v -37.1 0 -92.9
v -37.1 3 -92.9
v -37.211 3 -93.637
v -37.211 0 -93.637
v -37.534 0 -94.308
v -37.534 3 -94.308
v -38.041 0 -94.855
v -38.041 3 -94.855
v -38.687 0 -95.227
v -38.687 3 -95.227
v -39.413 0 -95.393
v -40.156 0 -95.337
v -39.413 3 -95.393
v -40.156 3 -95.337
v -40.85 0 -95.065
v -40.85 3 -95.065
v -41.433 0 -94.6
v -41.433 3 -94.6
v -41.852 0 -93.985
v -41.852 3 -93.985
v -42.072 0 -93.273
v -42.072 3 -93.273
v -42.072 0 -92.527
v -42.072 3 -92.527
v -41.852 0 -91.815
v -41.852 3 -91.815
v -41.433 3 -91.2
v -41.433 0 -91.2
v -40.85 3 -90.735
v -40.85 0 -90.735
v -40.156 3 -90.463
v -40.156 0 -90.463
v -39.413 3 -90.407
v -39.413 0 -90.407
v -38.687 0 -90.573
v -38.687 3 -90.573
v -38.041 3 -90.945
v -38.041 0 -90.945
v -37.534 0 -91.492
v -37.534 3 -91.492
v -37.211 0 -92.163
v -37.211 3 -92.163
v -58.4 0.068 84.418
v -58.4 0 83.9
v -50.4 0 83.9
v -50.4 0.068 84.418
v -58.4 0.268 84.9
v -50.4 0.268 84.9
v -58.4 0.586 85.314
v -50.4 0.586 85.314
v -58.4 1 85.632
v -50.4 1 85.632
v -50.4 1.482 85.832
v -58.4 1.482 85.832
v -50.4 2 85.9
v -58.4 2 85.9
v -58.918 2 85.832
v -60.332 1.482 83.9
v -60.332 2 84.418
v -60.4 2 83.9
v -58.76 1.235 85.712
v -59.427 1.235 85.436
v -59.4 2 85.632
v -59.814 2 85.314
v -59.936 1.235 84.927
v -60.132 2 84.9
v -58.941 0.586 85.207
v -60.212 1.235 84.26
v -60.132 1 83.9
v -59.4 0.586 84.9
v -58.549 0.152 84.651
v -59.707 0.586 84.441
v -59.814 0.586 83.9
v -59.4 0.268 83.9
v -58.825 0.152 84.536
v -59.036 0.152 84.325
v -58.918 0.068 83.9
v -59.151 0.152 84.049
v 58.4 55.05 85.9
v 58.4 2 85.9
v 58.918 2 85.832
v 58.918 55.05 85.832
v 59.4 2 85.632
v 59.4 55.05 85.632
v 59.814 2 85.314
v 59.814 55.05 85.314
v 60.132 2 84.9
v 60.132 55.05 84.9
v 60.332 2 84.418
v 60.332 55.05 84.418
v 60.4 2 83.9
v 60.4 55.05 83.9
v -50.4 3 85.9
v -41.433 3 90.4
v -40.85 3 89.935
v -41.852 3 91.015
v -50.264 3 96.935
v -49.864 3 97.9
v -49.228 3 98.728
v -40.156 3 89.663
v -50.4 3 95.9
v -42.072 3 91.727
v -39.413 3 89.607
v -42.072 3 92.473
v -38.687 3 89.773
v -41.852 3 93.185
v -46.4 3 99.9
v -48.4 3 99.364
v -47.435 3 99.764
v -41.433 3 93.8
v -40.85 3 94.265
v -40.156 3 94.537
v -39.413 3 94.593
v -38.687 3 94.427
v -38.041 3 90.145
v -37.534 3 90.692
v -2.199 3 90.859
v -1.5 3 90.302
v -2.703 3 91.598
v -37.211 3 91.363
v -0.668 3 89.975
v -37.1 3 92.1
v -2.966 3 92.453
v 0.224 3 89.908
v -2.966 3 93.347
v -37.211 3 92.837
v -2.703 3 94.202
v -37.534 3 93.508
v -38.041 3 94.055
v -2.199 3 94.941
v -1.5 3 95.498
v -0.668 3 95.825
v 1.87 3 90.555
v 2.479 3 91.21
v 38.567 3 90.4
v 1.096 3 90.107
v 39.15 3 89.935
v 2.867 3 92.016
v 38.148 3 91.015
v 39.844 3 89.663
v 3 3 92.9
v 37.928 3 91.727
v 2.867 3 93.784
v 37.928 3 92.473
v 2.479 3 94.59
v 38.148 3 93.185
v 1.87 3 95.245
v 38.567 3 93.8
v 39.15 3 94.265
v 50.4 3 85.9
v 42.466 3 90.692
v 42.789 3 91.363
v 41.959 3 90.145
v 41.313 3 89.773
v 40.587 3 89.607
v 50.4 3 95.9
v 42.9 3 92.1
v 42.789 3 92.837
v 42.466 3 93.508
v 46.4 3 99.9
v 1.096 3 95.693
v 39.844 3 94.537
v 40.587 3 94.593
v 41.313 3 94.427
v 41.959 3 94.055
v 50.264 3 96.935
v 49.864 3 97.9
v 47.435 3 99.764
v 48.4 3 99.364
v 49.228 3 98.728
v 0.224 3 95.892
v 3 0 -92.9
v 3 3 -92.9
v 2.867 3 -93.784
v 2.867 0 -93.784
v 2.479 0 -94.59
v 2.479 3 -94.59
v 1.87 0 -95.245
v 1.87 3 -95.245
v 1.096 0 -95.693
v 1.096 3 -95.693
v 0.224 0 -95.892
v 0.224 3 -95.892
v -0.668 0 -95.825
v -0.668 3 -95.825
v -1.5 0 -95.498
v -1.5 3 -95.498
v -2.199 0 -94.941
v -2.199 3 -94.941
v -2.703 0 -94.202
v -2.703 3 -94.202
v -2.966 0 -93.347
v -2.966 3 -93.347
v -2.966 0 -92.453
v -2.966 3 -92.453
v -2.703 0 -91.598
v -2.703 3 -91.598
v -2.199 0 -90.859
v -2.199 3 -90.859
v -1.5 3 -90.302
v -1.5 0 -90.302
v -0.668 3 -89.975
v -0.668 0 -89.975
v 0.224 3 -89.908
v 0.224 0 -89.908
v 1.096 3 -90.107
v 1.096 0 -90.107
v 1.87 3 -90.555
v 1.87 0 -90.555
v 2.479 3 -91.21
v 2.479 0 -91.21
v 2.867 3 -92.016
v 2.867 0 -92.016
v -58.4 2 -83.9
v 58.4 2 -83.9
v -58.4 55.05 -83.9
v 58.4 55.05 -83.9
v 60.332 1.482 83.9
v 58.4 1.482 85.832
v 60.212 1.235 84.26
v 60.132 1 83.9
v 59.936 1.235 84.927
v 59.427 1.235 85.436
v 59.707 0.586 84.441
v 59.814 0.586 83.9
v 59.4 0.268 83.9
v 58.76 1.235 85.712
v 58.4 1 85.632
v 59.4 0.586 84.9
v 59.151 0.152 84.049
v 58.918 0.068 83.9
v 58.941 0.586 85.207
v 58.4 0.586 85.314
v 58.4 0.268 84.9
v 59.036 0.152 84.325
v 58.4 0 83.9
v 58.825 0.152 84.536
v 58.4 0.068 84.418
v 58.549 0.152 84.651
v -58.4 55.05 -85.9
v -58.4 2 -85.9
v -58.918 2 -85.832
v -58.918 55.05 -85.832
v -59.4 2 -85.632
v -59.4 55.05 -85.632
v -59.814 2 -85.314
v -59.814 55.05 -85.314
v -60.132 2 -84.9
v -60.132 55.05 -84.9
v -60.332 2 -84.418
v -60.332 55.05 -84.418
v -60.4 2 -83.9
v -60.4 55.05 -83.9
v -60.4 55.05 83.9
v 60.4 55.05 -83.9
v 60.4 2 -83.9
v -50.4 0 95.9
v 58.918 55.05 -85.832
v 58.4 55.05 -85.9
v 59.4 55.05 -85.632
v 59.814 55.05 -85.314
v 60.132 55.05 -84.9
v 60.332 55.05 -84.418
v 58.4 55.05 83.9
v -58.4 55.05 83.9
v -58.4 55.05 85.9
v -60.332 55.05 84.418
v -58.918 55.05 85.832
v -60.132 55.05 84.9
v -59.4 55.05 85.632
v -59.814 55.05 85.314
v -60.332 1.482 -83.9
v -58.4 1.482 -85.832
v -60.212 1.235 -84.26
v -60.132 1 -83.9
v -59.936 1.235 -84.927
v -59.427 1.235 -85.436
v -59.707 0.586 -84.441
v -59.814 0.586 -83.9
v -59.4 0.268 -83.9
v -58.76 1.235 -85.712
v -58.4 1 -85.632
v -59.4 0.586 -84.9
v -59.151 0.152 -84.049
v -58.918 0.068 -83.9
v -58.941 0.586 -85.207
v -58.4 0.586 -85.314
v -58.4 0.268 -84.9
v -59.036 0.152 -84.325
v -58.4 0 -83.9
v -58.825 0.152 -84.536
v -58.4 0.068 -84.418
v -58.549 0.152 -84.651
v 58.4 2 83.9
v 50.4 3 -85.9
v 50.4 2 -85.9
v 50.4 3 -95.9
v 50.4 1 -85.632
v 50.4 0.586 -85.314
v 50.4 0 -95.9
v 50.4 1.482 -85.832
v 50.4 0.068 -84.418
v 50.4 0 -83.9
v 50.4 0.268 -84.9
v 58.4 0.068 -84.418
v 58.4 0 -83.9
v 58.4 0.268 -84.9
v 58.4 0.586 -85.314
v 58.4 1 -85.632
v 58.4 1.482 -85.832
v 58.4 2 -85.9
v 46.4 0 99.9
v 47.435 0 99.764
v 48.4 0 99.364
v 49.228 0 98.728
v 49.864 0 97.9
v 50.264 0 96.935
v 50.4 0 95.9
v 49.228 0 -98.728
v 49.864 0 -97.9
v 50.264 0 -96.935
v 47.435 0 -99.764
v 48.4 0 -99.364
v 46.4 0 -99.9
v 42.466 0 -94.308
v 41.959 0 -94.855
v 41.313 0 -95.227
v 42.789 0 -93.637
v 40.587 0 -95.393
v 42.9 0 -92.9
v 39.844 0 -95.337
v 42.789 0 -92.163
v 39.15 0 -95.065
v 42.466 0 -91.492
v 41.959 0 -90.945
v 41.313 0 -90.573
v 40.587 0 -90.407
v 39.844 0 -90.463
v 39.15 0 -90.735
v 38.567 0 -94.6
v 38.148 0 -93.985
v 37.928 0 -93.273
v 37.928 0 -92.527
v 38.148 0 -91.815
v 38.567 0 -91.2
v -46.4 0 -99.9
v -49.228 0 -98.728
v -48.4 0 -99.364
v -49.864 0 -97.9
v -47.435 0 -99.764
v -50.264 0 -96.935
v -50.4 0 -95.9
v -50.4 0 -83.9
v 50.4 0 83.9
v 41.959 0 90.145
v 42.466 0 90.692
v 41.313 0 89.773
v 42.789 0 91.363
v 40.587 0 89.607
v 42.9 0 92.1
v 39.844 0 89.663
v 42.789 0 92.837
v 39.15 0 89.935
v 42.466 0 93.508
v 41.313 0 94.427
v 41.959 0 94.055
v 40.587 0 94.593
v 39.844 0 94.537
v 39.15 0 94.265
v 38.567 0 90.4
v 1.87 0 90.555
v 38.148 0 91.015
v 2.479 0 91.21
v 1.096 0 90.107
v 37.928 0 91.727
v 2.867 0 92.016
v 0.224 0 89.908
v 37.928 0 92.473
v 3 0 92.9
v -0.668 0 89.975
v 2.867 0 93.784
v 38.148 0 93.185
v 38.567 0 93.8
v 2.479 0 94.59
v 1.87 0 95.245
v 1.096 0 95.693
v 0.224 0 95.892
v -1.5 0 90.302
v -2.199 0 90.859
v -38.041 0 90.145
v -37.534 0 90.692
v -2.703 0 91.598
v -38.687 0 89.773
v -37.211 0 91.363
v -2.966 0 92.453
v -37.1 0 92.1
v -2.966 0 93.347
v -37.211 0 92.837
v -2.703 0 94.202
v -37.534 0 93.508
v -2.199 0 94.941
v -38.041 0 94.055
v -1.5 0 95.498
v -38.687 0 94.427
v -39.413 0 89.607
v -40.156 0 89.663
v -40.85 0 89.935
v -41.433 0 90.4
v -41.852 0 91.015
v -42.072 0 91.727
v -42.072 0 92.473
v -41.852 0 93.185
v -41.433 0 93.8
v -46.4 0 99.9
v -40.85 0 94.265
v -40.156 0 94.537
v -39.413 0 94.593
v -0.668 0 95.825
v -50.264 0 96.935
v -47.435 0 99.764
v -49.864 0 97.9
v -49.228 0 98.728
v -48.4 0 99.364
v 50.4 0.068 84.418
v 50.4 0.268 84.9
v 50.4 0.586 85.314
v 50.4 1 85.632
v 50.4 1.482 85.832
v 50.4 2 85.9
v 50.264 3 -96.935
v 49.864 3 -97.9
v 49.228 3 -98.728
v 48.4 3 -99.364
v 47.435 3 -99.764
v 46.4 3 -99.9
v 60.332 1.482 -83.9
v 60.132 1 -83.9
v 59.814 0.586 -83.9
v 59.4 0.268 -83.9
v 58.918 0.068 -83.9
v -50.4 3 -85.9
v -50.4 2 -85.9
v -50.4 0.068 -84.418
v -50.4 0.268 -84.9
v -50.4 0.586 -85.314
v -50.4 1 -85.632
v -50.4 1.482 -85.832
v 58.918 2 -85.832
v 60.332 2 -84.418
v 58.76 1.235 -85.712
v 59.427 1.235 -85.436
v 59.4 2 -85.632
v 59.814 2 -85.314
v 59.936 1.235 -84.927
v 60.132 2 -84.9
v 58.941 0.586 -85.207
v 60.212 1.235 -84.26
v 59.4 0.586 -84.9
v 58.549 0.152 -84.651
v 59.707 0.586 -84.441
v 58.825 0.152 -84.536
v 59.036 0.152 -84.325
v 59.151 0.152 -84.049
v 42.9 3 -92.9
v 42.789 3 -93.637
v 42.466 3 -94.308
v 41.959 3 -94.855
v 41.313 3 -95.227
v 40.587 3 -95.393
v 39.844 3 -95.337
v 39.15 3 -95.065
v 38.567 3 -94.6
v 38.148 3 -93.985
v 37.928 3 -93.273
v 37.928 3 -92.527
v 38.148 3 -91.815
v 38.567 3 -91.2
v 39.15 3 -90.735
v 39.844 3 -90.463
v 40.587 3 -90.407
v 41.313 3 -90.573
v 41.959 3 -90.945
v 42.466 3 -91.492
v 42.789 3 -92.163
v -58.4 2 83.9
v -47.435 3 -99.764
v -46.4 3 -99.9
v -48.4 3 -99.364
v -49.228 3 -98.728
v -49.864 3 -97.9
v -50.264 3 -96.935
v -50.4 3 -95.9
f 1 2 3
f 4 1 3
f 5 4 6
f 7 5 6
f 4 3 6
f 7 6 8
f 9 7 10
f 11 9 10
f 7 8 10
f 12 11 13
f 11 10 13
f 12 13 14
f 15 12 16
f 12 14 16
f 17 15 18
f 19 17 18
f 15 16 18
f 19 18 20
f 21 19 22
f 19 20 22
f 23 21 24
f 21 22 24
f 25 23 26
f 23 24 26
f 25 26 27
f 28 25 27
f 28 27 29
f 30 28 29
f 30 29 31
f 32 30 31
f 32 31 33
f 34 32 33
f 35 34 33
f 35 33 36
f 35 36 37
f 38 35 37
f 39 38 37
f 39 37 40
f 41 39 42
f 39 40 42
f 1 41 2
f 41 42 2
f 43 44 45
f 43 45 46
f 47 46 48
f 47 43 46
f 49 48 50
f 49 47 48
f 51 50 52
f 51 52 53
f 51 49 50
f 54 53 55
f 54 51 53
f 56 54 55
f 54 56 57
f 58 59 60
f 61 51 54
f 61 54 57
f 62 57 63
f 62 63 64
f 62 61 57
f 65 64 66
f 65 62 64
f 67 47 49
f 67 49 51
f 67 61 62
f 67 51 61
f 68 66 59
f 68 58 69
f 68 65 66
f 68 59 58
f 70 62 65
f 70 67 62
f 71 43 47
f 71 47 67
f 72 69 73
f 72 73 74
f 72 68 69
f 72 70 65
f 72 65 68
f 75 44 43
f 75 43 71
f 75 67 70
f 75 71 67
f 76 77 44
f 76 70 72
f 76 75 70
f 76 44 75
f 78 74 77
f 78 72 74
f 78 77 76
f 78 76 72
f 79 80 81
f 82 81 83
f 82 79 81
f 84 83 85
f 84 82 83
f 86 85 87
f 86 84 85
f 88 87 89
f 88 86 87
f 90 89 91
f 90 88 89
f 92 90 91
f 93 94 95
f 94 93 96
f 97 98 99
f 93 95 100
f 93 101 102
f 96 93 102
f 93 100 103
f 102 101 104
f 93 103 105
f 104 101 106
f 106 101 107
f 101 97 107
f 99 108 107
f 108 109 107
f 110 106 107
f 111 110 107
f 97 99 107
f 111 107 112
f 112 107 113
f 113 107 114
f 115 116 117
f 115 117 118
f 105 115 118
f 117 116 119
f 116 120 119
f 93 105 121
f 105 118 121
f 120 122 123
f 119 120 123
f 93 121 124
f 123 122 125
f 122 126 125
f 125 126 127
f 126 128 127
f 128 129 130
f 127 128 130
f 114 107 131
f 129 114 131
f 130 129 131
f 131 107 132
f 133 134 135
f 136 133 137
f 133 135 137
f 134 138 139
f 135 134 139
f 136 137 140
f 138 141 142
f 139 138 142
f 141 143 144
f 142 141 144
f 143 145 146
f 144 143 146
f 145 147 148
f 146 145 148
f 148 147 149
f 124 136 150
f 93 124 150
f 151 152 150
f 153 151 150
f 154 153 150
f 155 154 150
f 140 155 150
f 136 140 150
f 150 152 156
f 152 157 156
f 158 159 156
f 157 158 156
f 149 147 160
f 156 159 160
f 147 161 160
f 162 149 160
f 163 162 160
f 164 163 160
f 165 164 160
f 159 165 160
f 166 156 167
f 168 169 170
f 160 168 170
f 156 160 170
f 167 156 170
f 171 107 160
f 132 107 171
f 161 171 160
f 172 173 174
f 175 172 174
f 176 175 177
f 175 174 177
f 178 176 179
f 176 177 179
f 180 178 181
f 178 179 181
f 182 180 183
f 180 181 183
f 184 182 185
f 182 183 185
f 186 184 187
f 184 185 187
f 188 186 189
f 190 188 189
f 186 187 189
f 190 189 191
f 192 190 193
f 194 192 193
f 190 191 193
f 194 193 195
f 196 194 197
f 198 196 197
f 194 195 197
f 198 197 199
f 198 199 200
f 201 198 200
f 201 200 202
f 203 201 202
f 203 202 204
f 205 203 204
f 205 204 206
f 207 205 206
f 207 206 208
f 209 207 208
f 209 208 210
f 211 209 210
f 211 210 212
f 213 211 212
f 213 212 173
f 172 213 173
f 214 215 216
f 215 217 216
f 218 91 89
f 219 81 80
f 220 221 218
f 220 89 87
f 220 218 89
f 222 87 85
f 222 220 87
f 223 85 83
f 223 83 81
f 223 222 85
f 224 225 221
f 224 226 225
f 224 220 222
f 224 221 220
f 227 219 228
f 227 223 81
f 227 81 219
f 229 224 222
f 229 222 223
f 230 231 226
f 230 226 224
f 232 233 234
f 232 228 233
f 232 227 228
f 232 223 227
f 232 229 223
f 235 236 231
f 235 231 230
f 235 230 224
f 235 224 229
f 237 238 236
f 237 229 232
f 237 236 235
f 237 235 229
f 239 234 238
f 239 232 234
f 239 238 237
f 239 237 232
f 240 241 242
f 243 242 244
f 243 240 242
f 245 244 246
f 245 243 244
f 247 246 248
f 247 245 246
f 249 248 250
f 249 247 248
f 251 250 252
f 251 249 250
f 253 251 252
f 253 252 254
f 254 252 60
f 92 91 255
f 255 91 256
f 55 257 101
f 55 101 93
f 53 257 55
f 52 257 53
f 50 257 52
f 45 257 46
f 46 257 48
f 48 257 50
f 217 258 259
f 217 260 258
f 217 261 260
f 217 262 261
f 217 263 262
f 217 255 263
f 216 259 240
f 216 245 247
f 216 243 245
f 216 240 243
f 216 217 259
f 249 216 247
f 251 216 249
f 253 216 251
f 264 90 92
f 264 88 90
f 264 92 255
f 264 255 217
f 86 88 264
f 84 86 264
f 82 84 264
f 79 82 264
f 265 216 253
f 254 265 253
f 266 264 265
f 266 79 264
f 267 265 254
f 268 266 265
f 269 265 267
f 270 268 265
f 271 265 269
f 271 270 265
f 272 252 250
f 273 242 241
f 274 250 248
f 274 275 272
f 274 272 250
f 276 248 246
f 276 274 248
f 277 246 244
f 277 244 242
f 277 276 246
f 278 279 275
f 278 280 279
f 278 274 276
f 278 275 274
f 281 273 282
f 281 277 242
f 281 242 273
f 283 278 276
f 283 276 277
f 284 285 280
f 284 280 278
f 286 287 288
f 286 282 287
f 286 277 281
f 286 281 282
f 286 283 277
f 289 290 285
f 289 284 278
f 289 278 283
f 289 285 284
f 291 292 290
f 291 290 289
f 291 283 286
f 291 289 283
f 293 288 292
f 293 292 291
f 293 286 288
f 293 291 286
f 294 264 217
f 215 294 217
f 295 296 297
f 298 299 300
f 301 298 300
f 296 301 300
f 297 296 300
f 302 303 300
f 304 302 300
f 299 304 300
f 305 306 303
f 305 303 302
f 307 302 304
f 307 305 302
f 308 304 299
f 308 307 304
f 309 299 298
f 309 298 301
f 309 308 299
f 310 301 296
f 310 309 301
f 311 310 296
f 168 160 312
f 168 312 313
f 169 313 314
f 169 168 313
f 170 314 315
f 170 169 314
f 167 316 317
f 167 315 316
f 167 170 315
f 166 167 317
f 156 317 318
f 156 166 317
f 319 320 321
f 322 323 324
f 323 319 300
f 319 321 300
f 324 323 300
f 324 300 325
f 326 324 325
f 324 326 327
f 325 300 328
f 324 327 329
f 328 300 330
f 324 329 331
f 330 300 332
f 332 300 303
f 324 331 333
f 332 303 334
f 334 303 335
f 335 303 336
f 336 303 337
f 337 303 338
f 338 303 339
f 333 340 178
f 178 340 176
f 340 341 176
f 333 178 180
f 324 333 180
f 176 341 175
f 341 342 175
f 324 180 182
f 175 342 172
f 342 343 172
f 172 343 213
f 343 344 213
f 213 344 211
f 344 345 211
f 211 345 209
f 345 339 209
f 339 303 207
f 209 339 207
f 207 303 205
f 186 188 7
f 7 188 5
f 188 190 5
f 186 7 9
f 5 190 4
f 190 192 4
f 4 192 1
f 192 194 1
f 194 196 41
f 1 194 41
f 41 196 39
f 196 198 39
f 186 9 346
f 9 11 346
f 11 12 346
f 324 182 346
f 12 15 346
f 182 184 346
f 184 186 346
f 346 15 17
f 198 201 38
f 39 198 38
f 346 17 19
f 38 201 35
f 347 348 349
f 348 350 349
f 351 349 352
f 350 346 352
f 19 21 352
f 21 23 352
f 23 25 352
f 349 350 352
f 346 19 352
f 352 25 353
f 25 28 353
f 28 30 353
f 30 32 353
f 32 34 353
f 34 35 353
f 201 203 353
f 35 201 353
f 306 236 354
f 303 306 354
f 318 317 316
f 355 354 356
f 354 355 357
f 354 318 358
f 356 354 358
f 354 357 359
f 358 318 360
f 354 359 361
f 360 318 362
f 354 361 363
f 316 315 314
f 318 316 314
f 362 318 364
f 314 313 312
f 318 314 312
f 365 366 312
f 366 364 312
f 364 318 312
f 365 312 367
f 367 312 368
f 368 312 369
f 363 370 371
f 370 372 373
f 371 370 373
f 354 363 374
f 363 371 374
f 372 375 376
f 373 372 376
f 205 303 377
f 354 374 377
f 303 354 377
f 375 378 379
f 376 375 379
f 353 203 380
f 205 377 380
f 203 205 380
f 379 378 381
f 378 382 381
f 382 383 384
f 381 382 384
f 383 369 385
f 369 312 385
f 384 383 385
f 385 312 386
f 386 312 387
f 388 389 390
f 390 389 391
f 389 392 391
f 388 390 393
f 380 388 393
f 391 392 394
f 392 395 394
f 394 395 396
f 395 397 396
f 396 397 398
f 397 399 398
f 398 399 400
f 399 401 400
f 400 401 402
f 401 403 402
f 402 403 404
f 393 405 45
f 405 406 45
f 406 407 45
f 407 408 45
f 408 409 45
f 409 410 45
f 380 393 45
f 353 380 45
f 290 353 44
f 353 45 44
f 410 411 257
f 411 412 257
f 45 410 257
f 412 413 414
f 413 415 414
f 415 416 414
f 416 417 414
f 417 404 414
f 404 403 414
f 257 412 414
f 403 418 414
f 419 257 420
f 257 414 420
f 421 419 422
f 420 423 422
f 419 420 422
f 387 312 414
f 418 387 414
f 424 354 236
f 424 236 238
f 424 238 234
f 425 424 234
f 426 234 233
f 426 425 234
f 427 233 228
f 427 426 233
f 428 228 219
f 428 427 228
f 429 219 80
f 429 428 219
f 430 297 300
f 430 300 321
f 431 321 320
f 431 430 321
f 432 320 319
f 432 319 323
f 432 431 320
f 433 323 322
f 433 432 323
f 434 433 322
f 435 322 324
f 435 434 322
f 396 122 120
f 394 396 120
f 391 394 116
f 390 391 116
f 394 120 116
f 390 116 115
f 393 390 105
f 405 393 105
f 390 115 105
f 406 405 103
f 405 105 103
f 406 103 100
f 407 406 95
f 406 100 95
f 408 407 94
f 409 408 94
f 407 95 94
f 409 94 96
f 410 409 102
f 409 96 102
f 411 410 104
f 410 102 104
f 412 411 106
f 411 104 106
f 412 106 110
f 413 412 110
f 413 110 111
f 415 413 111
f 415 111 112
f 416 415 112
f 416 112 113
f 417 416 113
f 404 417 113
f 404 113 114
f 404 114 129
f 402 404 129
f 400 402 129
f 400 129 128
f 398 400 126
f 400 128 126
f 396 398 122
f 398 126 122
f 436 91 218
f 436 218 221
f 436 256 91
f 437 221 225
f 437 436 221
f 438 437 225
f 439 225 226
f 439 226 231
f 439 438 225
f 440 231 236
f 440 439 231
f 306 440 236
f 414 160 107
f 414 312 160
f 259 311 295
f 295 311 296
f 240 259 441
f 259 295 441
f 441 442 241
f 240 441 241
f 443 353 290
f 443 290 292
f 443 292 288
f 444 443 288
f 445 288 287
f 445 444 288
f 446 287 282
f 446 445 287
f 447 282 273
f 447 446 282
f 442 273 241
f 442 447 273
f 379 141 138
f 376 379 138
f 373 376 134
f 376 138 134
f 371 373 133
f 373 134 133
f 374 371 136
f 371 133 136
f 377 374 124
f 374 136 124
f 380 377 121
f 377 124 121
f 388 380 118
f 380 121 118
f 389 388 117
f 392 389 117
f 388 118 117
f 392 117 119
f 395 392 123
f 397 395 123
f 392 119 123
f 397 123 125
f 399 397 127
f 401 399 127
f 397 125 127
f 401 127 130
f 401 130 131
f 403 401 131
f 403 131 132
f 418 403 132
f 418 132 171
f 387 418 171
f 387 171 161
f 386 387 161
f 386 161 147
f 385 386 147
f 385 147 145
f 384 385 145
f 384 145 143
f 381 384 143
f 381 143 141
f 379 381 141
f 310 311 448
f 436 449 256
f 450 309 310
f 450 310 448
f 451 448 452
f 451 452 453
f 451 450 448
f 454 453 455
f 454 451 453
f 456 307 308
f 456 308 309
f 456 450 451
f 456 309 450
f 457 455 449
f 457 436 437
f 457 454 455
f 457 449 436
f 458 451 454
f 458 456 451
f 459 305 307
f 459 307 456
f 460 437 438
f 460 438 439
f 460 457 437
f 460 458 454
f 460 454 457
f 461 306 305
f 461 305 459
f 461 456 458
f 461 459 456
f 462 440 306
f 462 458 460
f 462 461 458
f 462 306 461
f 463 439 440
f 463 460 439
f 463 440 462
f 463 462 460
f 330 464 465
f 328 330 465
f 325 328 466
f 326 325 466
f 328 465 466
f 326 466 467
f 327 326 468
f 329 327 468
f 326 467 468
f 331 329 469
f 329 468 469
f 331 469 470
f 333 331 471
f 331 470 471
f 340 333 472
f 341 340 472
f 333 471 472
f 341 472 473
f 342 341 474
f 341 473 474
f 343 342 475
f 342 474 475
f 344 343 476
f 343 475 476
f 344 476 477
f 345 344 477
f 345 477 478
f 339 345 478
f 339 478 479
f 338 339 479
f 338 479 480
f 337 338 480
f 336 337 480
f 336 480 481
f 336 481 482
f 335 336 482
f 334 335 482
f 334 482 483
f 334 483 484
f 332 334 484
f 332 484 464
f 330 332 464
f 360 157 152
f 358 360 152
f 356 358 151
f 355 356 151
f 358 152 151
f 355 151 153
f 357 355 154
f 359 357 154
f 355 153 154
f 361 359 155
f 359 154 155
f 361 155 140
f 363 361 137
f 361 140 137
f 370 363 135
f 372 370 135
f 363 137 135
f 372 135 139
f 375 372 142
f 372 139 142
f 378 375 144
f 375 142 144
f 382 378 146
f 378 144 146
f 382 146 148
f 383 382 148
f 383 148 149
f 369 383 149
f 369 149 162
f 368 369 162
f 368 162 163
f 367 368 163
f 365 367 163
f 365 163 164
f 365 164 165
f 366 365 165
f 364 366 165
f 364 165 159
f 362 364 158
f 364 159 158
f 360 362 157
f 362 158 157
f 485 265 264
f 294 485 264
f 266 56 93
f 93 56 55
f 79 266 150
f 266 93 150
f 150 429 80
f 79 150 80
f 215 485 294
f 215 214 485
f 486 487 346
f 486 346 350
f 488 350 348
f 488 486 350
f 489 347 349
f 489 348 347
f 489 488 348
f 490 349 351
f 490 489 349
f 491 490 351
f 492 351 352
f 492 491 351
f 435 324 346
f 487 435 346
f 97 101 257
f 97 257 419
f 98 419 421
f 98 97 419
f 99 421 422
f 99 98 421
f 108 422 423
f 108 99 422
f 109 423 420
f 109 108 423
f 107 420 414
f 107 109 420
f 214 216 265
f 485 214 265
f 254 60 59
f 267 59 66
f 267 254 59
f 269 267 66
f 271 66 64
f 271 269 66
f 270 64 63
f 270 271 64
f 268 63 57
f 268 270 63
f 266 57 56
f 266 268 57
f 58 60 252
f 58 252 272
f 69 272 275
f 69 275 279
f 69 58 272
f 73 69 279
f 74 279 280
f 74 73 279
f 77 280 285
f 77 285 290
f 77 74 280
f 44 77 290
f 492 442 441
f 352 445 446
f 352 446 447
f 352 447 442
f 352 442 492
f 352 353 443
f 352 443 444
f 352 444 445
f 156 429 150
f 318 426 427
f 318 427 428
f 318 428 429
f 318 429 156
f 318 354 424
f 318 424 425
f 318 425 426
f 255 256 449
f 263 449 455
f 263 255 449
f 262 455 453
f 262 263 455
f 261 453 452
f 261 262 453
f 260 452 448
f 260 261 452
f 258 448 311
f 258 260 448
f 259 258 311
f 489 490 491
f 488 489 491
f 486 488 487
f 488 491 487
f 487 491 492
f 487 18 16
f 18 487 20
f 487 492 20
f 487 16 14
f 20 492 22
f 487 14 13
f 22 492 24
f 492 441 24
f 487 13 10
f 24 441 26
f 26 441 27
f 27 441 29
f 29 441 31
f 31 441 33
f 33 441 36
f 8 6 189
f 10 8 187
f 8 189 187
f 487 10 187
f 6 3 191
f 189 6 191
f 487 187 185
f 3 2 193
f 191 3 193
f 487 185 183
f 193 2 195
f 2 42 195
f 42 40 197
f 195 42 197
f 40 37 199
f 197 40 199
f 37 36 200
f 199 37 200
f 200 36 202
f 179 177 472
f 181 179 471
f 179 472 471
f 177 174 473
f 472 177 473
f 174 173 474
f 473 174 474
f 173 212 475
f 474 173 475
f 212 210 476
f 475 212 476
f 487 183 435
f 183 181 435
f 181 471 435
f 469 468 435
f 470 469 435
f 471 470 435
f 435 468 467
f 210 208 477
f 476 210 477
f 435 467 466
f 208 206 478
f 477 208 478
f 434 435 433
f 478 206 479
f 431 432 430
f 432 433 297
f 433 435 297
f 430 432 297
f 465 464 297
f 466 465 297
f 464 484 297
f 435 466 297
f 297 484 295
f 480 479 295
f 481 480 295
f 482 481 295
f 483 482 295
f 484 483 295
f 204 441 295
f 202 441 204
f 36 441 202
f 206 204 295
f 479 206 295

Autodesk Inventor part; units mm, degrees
ref_plane "XZ Plane" through (0, 0, 0) normal (0, 1, 0) x (-1, 0, 0)
sketch "Sketch1" plane through (0, 0, 0) normal (0, 1, 0) x (-1, 0, 0)
  line L0 (60.4, 85.9) -> (-60.4, 85.9)
  line L1 (-60.4, 85.9) -> (-60.4, -85.9)
  line L2 (-60.4, -85.9) -> (60.4, -85.9)
  line L3 (60.4, -85.9) -> (60.4, 85.9)
  point P0 (0, 0)
  dimension "d0" = 85.9
  dimension "d1" = 85.9
  dimension "d2" = 60.4
  dimension "d3" = 60.4
extrude "Extrusion1" add sketch "Sketch1" along normal blind 55.05
fillet "Fillet1" radius 2 6 edges at (60.4, 27.525, 85.9) (-60.4, 27.525, 85.9) (60.4, 27.525, -85.9) (-60.4, 27.525, -85.9) (60.4, 0, 0) (-60.4, 0, 0)
sketch "Sketch2" plane through (0, 55.05, 0) normal (0, 1, 0) x (1, 0, 0)
  line L0 (-58.4, -83.9) -> (58.4, -83.9)
  line L1 (58.4, -83.9) -> (58.4, 83.9)
  line L2 (58.4, 83.9) -> (-58.4, 83.9)
  line L3 (-58.4, 83.9) -> (-58.4, -83.9)
  line L4 (-60.4, 83.9) -> (-60.4, -83.9) projected
  line L5 (-58.4, -85.9) -> (58.4, -85.9) projected
  line L6 (60.4, -83.9) -> (60.4, 83.9) projected
  line L7 (58.4, 85.9) -> (-58.4, 85.9) projected
  point P0 (0, 0)
  dimension "d7" = 2
  dimension "d8" = 2
  dimension "d9" = 2
  dimension "d10" = 2
extrude "Extrusion2" cut sketch "Sketch2" against normal blind 53.05
sketch "Sketch3" plane through (0, 0, 0) normal (0, -1, 0) x (1, 0, 0)
  line L0 (-58.4, -85.9) -> (-58.4, 85.9) projected
  line L1 (58.4, -85.9) -> (-58.4, -85.9) projected
  line L2 (58.4, 85.9) -> (58.4, -85.9) projected
  line L3 (-58.4, 85.9) -> (58.4, 85.9) projected
  line L4 (-58.4, 85.9) -> (58.4, 85.9) projected
  line L5 (50.4, 85.9) -> (50.4, 99.9)
  line L6 (50.4, 99.9) -> (-50.4, 99.9)
  line L7 (-50.4, 99.9) -> (-50.4, 85.9)
  line L8 (-60.4, 83.9) -> (-60.4, -83.9) projected
  line L9 (60.4, -83.9) -> (60.4, 83.9) projected
  line L10 (-134.6994, 0) -> (135.5184, 0) construction
  line L11 (50.4, -85.9) -> (50.4, -99.9)
  line L12 (50.4, -99.9) -> (-50.4, -99.9)
  line L13 (-50.4, -99.9) -> (-50.4, -85.9)
  line L14 (50.4, 85.9) -> (-50.4, 85.9)
  line L15 (-50.4, -85.9) -> (50.4, -85.9)
  point P0 (0, 0)
  dimension "d13" = 10
  dimension "d14" = 10
  dimension "d15" = 14
  dimension "d16" = 0
extrude "Extrusion3" add sketch "Sketch3" against normal blind 3 contours L1 L11 L12 L13 | L7 L6 L5 L3
fillet "Fillet2" radius 4 4 edges at (-50.4, 1.5, -99.9) (50.4, 1.5, -99.9) (50.4, 1.5, 99.9) (-50.4, 1.5, 99.9)
fillet "Fillet3" radius 2 8 edges at (-59.8142, 0.5858, 85.3142) (-54.4, 0, 85.9) (59.8142, 0.5858, 85.3142) (54.4, 0, 85.9) (59.8142, 0.5858, -85.3142) (54.4, 0, -85.9) (-59.8142, 0.5858, -85.3142) (-54.4, 0, -85.9)
sketch "Sketch4" plane through (0, 2, 0) normal (0, 1, 0) x (1, 0, 0)
  circle A0 centre (-54.9, 80.4) radius 1.25
  line L0 (58.4, 85.9) -> (-58.4, 85.9) projected
  line L1 (-60.4, 83.9) -> (-60.4, -83.9) projected
  circle A1 centre (54.1, 80.4) radius 1.25
  circle A2 centre (-54.9, -79.6) radius 1.25
  circle A3 centre (54.1, -79.6) radius 1.25
  circle A4 centre (-54.9, 80.4) radius 2.25
  circle A5 centre (-54.9, -79.6) radius 2.25
  circle A6 centre (54.1, 80.4) radius 2.25
  circle A7 centre (54.1, -79.6) radius 2.25
  line L2 (-58.4, 83.9) -> (-60.4, 83.9) projected
  line L3 (-58.4, 83.9) -> (-58.4, 75.9)
  line L4 (-58.4, 83.9) -> (-58.4, -83.9) projected
  line L5 (-58.4, 85.9) -> (-58.4, 83.9) projected
  line L6 (-58.4, 83.9) -> (-50.4, 83.9)
  line L7 (-58.4, 83.9) -> (58.4, 83.9) projected
  arc A8 (-55.4407, 78.2159) -> (-58.4, 75.9) centre (-56.0141, 75.9) ccw
  arc A9 (-50.4, 83.9) -> (-52.7159, 80.9407) centre (-50.4, 81.5141) ccw
  line L8 (58.4, 83.9) -> (58.4, -83.9) projected
  line L9 (58.4, 83.9) -> (48.8739, 83.9)
  line L10 (58.4, 83.9) -> (58.4, 75.9)
  line L11 (58.4, -83.9) -> (58.4, 83.9) projected
  line L12 (58.4, -83.9) -> (-58.4, -83.9) projected
  line L13 (-58.4, -83.9) -> (-58.4, -75.9)
  line L14 (-58.4, -83.9) -> (-58.4, 83.9) projected
  line L15 (-58.4, -83.9) -> (-50.4, -83.9)
  arc A10 (-52.7997, -80.4071) -> (-50.4, -83.9) centre (-50.4, -81.3292) ccw
  arc A11 (-58.4, -75.9) -> (-55.8323, -77.5522) centre (-56.5846, -75.9) ccw
  line L16 (58.4, -83.9) -> (50.4, -83.9)
  line L17 (58.4, -83.9) -> (58.4, -75.9)
  arc A12 (55.2614, -77.6729) -> (58.4, -75.9) centre (56.33, -75.9) ccw
  arc A13 (50.4, -83.9) -> (52.1729, -80.7614) centre (50.4, -81.83) ccw
  circle A14 centre (54.5, 0) radius 1.25
  circle A15 centre (-54.5, 0) radius 1.25
  circle A16 centre (-54.5, 0) radius 2.25
  circle A17 centre (54.5, 0) radius 2.25
  line L18 (54.5, -2.25) -> (56.9, -2.25)
  line L19 (54.5, 2.25) -> (56.9, 2.25)
  line L20 (-54.5, -2.25) -> (-56.9, -2.25)
  line L21 (-54.5, 2.25) -> (-56.9, 2.25)
  line L22 (0, 85.9) -> (0, 75.9)
  line L23 (-58.4, -83.9) -> (-58.4, 83.9) projected
  line L24 (58.4, -83.9) -> (-58.4, -83.9) projected
  line L25 (-58.4, 83.9) -> (58.4, 83.9) projected
  arc A18 (58.4, -3.75) -> (56.9, -2.25) centre (56.9, -3.75) ccw
  line L26 (58.4, 83.9) -> (58.4, -83.9) projected
  arc A19 (56.9, 2.25) -> (58.4, 3.75) centre (56.9, 3.75) ccw
  arc A20 (-56.9, -2.25) -> (-58.4, -3.75) centre (-56.9, -3.75) ccw
  arc A21 (-58.4, 3.75) -> (-56.9, 2.25) centre (-56.9, 3.75) ccw
  arc A22 (51.8602, 80.6143) -> (48.8739, 83.9) centre (48.8739, 80.9) ccw
  arc A23 (58.4, 75.3135) -> (54.6571, 78.2201) centre (55.4, 75.3135) ccw
  line L27 (-58.4, 75.9) -> (-58.4, 83.7116)
  line L28 (-58.4, 75.9) -> (-58.4, 83.9)
  line L29 (-50.4, 83.9) -> (-58.4, 83.9)
  line L30 (60.4, 83.9) -> (58.4, 83.9) projected
  line L31 (48.8739, 83.9) -> (58.4, 83.9)
  line L32 (58.4, 83.9) -> (58.4, 75.3135)
  point P0 (0, 0)
  point P1 (58.4, -2.25)
  point P2 (58.4, 2.25)
  point P3 (-58.4, -2.25)
  point P4 (-58.4, 2.25)
  dimension "d21" = 2.5
  dimension "d23" = 5.5
  dimension "d24" = 5.5
  dimension "d27" = 109
  dimension "d30" = 160
  dimension "d33" = 4.5
  dimension "d36" = 160
  dimension "d39" = 109
  dimension "d42" = 8
  dimension "d43" = 8
  dimension "d46" = 8
  dimension "d47" = 8
  dimension "d48" = 8
  dimension "d49" = 8
  dimension "d52" = 2.5
  dimension "d53" = 2.5
  dimension "d54" = 3.9
  dimension "d56" = 3.9
  dimension "d57" = 0
  dimension "d58" = 0
  dimension "d59" = 4.5
  dimension "d60" = 4.5
  dimension "d115" = 1.5
  dimension "d116" = 1.5
  dimension "d117" = 1.5
  dimension "d118" = 1.5
  dimension "d119" = 3
  dimension "d120" = 3
sketch "Sketch6" plane through (0, 3, 0) normal (0, 1, 0) x (1, 0, 0)
  circle A0 centre (40.4, 92.9) radius 2.5
  line L0 (50.4, 85.9) -> (50.4, 95.9) projected
  line L1 (46.4, 99.9) -> (-46.4, 99.9) projected
  circle A1 centre (-39.6, 92.9) radius 2.5
  circle A2 centre (40.4, -92.1) radius 2.5
  circle A3 centre (-39.6, -92.1) radius 2.5
  circle A4 centre (0, 92.9) radius 3
  circle A5 centre (0, -92.9) radius 3
  line L2 (-50.4, -85.9) -> (50.4, -85.9) projected
  line L3 (0, 139.86) -> (0, -139.86) projected
  line L4 (50.4, 85.9) -> (-50.4, 85.9) projected
  point P0 (0, 0)
  dimension "d62" = 5
  dimension "d63" = 10
  dimension "d64" = 7
  dimension "d67" = 80
  dimension "d70" = 185
  dimension "d109" = 6
  dimension "d110" = 6
  dimension "d111" = 7
  dimension "d112" = 0
  dimension "d113" = 7
  dimension "d114" = 0
extrude "Extrusion5" cut sketch "Sketch6" against normal blind 3
sketch "Sketch8" plane through (0, 55.05, 0) normal (0, 1, 0) x (1, 0, 0)
  line L0 (58.4, 83.9) -> (58.4, -83.9) projected
  line L1 (58.4, -83.9) -> (-58.4, -83.9) projected
  line L2 (-58.4, -83.9) -> (-58.4, 83.9) projected
  line L3 (-58.4, 83.9) -> (58.4, 83.9) projected
  arc A0 (-60.4, -83.9) -> (-58.4, -85.9) centre (-58.4, -83.9) ccw projected
  line L4 (-58.4, -85.9) -> (58.4, -85.9) projected
  arc A1 (58.4, -85.9) -> (60.4, -83.9) centre (58.4, -83.9) ccw projected
  line L5 (60.4, -83.9) -> (60.4, 83.9) projected
  arc A2 (60.4, 83.9) -> (58.4, 85.9) centre (58.4, 83.9) ccw projected
  line L6 (58.4, 85.9) -> (-58.4, 85.9) projected
  arc A3 (-58.4, 85.9) -> (-60.4, 83.9) centre (-58.4, 83.9) ccw projected
  line L7 (-60.4, 83.9) -> (-60.4, -83.9) projected
  point P0 (0, 0)
equation "\"d1\" = d0"
equation "\"d3\" = d2"
equation "\"d7\" = d8"
equation "\"d9\" = d8"
equation "\"d10\" = d8"
properties part number "Main Enclosure Base 2"
